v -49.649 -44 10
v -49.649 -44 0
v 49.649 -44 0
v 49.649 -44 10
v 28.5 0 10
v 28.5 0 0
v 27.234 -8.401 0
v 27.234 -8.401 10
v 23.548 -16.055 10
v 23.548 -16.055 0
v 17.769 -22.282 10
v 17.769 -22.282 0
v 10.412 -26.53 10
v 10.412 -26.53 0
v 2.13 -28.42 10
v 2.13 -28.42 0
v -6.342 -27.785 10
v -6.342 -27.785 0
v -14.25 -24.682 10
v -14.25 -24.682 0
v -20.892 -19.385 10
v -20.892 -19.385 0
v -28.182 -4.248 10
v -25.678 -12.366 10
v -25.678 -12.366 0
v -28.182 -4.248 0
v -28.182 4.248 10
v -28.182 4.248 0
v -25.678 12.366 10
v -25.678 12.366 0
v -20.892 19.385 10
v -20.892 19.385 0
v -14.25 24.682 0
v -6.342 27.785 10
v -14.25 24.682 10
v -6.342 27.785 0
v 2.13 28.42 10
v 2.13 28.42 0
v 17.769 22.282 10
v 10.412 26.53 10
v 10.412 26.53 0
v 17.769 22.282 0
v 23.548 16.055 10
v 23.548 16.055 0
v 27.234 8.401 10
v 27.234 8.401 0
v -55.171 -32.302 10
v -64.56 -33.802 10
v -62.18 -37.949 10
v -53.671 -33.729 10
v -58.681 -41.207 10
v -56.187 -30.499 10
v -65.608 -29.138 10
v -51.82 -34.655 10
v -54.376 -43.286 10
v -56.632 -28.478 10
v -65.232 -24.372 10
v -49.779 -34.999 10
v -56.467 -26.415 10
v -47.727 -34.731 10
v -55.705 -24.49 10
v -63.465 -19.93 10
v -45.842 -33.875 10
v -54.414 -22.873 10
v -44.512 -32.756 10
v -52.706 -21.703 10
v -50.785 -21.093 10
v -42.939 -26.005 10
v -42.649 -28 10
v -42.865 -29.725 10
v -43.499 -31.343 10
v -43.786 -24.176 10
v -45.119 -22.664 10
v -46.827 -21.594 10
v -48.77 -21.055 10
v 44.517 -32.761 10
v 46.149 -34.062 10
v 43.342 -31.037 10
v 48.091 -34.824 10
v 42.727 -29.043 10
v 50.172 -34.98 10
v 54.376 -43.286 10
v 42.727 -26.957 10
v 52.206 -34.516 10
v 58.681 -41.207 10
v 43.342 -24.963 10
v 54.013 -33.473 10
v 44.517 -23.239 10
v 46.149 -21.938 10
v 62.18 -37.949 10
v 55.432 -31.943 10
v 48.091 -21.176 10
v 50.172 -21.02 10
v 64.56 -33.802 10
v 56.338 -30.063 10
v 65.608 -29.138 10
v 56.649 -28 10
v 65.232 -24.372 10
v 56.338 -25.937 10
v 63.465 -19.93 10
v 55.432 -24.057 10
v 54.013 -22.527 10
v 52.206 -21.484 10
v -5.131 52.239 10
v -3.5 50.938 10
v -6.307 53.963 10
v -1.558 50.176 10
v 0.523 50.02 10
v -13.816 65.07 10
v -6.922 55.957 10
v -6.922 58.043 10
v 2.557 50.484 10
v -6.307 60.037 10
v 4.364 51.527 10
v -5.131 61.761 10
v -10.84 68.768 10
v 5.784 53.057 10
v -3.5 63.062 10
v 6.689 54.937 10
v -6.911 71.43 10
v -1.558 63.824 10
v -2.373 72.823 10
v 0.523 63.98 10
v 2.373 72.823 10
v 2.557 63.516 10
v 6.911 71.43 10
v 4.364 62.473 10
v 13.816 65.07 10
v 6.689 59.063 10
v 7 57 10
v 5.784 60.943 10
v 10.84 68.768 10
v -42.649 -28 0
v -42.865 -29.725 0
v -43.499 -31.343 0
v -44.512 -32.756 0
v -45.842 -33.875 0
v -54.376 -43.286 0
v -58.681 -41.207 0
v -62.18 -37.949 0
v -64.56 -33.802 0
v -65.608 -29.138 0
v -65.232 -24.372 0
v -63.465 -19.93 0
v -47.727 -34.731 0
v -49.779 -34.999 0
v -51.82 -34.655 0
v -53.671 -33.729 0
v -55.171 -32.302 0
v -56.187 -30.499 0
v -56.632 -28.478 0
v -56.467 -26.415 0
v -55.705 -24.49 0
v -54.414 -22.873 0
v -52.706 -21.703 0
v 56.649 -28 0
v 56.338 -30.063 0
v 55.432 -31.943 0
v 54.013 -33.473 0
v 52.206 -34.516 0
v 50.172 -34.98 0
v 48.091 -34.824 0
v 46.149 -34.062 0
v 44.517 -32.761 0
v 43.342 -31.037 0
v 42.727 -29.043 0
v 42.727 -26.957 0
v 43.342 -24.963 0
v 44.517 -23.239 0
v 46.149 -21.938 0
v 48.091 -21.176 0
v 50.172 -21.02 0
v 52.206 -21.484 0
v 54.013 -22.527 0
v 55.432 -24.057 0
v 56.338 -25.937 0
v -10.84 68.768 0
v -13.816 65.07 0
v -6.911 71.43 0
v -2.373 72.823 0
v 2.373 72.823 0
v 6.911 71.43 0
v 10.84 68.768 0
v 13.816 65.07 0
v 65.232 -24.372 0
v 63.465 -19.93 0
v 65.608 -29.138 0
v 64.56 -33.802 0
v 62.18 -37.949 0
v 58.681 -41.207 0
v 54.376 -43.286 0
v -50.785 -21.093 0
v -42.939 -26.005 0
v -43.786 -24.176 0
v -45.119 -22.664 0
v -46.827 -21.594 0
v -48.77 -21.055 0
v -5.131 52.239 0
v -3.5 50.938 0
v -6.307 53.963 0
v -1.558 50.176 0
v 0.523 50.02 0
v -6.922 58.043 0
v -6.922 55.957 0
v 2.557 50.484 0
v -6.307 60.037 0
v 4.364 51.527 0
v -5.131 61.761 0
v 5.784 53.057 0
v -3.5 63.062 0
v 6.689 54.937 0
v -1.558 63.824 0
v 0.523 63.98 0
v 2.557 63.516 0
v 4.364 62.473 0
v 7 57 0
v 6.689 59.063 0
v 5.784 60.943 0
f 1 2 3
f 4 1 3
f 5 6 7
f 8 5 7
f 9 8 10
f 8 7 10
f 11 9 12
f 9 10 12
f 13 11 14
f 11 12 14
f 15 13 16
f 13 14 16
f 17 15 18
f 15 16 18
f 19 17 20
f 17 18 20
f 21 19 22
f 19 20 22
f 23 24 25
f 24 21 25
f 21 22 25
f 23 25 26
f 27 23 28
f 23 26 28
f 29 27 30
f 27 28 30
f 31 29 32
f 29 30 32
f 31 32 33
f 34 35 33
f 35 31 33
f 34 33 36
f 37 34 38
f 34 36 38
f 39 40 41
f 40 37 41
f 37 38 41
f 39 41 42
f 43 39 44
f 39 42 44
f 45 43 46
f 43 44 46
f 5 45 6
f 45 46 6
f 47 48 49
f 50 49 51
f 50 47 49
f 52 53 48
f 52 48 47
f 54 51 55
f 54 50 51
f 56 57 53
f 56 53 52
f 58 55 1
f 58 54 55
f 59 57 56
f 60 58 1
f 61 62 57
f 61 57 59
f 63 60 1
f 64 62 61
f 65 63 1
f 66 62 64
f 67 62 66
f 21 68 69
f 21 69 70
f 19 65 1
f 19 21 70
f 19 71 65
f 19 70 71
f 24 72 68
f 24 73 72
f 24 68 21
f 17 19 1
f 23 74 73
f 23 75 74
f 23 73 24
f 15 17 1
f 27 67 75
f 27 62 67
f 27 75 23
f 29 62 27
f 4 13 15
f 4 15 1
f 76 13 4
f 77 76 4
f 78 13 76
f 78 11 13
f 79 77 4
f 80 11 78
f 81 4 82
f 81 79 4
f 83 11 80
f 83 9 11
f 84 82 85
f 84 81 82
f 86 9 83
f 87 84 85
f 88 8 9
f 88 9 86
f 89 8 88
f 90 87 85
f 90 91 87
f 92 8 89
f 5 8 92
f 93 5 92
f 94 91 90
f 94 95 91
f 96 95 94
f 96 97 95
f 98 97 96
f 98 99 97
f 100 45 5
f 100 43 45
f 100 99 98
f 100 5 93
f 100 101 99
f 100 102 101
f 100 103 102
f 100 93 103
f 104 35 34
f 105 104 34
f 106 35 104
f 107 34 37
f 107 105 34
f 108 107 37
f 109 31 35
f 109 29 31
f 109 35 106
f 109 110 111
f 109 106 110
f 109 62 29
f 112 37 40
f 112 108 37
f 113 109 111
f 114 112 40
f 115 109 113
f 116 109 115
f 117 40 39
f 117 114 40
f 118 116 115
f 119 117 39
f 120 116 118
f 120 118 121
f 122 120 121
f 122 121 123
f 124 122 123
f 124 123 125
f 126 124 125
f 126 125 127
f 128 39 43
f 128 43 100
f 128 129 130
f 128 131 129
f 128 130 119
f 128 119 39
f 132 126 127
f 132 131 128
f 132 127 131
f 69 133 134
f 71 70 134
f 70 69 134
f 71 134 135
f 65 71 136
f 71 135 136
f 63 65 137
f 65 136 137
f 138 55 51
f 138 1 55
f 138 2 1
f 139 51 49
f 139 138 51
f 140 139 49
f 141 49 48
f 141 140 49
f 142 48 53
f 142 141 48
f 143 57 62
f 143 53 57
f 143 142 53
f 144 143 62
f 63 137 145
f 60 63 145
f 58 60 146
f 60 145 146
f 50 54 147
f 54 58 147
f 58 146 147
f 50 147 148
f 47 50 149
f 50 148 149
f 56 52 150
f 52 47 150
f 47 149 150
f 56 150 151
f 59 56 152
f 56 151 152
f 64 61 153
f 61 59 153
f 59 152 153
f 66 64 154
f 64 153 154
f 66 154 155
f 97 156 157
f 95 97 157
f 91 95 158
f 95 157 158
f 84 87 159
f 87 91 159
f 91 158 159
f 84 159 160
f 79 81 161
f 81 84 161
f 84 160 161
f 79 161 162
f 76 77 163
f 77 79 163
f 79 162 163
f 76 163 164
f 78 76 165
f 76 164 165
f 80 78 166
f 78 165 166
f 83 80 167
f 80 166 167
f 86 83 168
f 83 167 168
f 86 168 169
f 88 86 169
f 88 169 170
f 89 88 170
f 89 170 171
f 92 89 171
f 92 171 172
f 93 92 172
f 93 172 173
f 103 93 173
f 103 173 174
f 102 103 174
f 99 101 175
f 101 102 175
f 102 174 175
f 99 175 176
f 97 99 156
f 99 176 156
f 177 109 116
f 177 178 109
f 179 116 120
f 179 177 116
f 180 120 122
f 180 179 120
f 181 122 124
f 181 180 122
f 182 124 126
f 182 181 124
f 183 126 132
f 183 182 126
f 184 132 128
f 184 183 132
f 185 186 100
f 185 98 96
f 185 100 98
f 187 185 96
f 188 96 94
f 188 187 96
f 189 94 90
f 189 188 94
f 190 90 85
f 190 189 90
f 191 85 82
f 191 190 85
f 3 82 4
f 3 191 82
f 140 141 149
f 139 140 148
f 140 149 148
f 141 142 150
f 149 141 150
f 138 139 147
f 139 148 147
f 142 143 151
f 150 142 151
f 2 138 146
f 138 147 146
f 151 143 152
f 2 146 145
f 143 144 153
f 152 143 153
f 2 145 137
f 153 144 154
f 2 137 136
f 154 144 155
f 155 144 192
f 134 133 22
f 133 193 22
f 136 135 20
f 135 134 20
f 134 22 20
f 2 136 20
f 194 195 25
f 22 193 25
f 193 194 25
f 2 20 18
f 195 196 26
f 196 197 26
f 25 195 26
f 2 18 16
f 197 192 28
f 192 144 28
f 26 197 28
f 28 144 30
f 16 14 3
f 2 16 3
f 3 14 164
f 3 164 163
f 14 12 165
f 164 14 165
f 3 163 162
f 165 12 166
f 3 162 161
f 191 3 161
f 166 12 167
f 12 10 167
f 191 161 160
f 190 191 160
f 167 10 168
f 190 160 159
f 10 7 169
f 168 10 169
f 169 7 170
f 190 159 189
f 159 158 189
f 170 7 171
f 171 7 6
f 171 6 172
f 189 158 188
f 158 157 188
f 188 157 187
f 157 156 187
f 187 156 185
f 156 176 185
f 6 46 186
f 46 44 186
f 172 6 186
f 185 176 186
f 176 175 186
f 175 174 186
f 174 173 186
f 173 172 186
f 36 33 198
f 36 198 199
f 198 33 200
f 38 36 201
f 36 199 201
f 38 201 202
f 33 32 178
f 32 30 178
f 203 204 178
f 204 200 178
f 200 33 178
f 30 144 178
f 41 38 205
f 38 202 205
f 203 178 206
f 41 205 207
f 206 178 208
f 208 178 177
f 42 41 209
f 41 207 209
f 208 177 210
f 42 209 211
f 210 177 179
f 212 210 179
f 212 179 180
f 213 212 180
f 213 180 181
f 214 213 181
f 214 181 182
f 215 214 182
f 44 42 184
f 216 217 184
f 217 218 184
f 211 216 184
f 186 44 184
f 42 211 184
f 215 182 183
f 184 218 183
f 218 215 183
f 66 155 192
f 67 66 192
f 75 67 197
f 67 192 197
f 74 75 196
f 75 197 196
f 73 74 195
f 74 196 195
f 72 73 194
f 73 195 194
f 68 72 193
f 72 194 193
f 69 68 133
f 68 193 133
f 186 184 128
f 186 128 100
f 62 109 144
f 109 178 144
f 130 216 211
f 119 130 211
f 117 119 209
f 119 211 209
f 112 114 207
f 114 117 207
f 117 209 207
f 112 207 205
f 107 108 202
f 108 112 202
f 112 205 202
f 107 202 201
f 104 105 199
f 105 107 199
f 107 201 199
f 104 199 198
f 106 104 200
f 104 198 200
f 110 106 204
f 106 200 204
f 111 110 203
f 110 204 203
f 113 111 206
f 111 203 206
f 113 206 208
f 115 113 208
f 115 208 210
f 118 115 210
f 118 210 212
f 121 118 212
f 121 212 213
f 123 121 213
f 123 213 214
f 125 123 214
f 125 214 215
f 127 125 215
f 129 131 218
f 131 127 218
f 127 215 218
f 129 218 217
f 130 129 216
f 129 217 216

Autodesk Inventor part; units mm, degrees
ref_plane "YZ Plane" through (0, 0, 0) normal (1, 0, 0) x (0, 1, 0)
ref_plane "XZ Plane" through (0, 0, 0) normal (0, 1, 0) x (-1, 0, 0)
ref_plane "XY Plane" through (0, 0, 0) normal (0, 0, 1) x (1, 0, 0)
sketch "스케치1" plane through (0, 0, 0) normal (0, 0, 1) x (1, 0, 0)
  circle A0 centre (0, 0) radius 28.5
  line L0 (0, 20.304) -> (0, -24.0188)
  line L1 (-22.2174, 0) -> (23.7675, 0)
  circle A1 centre (0, 57) radius 7
  circle A2 centre (-49.6488, -28) radius 7
  circle A3 centre (49.6488, -28) radius 7
  arc A4 (13.8158, 65.0699) -> (-13.8158, 65.0699) centre (0, 57) ccw
  arc A5 (-63.4646, -19.9301) -> (-49.6488, -44) centre (-49.6488, -28) ccw
  arc A6 (49.6488, -44) -> (63.4646, -19.9301) centre (49.6488, -28) ccw
  line L2 (-13.8158, 65.0699) -> (-63.4646, -19.9301)
  line L3 (13.8158, 65.0699) -> (63.4646, -19.9301)
  line L4 (-49.6488, -44) -> (49.6488, -44)
  arc A7 (-52.7065, -21.7031) -> (-45.8423, -33.8746) centre (0, 0) ccw
  dimension "d0" = 57
  dimension "d4" = 14
  dimension "d6" = 14
  dimension "d7" = 28
  dimension "d8" = 32
  dimension "d9" = 32
  dimension "d10" = 32
extrude "돌출1" add sketch "스케치1" along normal blind 10
properties part number "240412_sketch2"
